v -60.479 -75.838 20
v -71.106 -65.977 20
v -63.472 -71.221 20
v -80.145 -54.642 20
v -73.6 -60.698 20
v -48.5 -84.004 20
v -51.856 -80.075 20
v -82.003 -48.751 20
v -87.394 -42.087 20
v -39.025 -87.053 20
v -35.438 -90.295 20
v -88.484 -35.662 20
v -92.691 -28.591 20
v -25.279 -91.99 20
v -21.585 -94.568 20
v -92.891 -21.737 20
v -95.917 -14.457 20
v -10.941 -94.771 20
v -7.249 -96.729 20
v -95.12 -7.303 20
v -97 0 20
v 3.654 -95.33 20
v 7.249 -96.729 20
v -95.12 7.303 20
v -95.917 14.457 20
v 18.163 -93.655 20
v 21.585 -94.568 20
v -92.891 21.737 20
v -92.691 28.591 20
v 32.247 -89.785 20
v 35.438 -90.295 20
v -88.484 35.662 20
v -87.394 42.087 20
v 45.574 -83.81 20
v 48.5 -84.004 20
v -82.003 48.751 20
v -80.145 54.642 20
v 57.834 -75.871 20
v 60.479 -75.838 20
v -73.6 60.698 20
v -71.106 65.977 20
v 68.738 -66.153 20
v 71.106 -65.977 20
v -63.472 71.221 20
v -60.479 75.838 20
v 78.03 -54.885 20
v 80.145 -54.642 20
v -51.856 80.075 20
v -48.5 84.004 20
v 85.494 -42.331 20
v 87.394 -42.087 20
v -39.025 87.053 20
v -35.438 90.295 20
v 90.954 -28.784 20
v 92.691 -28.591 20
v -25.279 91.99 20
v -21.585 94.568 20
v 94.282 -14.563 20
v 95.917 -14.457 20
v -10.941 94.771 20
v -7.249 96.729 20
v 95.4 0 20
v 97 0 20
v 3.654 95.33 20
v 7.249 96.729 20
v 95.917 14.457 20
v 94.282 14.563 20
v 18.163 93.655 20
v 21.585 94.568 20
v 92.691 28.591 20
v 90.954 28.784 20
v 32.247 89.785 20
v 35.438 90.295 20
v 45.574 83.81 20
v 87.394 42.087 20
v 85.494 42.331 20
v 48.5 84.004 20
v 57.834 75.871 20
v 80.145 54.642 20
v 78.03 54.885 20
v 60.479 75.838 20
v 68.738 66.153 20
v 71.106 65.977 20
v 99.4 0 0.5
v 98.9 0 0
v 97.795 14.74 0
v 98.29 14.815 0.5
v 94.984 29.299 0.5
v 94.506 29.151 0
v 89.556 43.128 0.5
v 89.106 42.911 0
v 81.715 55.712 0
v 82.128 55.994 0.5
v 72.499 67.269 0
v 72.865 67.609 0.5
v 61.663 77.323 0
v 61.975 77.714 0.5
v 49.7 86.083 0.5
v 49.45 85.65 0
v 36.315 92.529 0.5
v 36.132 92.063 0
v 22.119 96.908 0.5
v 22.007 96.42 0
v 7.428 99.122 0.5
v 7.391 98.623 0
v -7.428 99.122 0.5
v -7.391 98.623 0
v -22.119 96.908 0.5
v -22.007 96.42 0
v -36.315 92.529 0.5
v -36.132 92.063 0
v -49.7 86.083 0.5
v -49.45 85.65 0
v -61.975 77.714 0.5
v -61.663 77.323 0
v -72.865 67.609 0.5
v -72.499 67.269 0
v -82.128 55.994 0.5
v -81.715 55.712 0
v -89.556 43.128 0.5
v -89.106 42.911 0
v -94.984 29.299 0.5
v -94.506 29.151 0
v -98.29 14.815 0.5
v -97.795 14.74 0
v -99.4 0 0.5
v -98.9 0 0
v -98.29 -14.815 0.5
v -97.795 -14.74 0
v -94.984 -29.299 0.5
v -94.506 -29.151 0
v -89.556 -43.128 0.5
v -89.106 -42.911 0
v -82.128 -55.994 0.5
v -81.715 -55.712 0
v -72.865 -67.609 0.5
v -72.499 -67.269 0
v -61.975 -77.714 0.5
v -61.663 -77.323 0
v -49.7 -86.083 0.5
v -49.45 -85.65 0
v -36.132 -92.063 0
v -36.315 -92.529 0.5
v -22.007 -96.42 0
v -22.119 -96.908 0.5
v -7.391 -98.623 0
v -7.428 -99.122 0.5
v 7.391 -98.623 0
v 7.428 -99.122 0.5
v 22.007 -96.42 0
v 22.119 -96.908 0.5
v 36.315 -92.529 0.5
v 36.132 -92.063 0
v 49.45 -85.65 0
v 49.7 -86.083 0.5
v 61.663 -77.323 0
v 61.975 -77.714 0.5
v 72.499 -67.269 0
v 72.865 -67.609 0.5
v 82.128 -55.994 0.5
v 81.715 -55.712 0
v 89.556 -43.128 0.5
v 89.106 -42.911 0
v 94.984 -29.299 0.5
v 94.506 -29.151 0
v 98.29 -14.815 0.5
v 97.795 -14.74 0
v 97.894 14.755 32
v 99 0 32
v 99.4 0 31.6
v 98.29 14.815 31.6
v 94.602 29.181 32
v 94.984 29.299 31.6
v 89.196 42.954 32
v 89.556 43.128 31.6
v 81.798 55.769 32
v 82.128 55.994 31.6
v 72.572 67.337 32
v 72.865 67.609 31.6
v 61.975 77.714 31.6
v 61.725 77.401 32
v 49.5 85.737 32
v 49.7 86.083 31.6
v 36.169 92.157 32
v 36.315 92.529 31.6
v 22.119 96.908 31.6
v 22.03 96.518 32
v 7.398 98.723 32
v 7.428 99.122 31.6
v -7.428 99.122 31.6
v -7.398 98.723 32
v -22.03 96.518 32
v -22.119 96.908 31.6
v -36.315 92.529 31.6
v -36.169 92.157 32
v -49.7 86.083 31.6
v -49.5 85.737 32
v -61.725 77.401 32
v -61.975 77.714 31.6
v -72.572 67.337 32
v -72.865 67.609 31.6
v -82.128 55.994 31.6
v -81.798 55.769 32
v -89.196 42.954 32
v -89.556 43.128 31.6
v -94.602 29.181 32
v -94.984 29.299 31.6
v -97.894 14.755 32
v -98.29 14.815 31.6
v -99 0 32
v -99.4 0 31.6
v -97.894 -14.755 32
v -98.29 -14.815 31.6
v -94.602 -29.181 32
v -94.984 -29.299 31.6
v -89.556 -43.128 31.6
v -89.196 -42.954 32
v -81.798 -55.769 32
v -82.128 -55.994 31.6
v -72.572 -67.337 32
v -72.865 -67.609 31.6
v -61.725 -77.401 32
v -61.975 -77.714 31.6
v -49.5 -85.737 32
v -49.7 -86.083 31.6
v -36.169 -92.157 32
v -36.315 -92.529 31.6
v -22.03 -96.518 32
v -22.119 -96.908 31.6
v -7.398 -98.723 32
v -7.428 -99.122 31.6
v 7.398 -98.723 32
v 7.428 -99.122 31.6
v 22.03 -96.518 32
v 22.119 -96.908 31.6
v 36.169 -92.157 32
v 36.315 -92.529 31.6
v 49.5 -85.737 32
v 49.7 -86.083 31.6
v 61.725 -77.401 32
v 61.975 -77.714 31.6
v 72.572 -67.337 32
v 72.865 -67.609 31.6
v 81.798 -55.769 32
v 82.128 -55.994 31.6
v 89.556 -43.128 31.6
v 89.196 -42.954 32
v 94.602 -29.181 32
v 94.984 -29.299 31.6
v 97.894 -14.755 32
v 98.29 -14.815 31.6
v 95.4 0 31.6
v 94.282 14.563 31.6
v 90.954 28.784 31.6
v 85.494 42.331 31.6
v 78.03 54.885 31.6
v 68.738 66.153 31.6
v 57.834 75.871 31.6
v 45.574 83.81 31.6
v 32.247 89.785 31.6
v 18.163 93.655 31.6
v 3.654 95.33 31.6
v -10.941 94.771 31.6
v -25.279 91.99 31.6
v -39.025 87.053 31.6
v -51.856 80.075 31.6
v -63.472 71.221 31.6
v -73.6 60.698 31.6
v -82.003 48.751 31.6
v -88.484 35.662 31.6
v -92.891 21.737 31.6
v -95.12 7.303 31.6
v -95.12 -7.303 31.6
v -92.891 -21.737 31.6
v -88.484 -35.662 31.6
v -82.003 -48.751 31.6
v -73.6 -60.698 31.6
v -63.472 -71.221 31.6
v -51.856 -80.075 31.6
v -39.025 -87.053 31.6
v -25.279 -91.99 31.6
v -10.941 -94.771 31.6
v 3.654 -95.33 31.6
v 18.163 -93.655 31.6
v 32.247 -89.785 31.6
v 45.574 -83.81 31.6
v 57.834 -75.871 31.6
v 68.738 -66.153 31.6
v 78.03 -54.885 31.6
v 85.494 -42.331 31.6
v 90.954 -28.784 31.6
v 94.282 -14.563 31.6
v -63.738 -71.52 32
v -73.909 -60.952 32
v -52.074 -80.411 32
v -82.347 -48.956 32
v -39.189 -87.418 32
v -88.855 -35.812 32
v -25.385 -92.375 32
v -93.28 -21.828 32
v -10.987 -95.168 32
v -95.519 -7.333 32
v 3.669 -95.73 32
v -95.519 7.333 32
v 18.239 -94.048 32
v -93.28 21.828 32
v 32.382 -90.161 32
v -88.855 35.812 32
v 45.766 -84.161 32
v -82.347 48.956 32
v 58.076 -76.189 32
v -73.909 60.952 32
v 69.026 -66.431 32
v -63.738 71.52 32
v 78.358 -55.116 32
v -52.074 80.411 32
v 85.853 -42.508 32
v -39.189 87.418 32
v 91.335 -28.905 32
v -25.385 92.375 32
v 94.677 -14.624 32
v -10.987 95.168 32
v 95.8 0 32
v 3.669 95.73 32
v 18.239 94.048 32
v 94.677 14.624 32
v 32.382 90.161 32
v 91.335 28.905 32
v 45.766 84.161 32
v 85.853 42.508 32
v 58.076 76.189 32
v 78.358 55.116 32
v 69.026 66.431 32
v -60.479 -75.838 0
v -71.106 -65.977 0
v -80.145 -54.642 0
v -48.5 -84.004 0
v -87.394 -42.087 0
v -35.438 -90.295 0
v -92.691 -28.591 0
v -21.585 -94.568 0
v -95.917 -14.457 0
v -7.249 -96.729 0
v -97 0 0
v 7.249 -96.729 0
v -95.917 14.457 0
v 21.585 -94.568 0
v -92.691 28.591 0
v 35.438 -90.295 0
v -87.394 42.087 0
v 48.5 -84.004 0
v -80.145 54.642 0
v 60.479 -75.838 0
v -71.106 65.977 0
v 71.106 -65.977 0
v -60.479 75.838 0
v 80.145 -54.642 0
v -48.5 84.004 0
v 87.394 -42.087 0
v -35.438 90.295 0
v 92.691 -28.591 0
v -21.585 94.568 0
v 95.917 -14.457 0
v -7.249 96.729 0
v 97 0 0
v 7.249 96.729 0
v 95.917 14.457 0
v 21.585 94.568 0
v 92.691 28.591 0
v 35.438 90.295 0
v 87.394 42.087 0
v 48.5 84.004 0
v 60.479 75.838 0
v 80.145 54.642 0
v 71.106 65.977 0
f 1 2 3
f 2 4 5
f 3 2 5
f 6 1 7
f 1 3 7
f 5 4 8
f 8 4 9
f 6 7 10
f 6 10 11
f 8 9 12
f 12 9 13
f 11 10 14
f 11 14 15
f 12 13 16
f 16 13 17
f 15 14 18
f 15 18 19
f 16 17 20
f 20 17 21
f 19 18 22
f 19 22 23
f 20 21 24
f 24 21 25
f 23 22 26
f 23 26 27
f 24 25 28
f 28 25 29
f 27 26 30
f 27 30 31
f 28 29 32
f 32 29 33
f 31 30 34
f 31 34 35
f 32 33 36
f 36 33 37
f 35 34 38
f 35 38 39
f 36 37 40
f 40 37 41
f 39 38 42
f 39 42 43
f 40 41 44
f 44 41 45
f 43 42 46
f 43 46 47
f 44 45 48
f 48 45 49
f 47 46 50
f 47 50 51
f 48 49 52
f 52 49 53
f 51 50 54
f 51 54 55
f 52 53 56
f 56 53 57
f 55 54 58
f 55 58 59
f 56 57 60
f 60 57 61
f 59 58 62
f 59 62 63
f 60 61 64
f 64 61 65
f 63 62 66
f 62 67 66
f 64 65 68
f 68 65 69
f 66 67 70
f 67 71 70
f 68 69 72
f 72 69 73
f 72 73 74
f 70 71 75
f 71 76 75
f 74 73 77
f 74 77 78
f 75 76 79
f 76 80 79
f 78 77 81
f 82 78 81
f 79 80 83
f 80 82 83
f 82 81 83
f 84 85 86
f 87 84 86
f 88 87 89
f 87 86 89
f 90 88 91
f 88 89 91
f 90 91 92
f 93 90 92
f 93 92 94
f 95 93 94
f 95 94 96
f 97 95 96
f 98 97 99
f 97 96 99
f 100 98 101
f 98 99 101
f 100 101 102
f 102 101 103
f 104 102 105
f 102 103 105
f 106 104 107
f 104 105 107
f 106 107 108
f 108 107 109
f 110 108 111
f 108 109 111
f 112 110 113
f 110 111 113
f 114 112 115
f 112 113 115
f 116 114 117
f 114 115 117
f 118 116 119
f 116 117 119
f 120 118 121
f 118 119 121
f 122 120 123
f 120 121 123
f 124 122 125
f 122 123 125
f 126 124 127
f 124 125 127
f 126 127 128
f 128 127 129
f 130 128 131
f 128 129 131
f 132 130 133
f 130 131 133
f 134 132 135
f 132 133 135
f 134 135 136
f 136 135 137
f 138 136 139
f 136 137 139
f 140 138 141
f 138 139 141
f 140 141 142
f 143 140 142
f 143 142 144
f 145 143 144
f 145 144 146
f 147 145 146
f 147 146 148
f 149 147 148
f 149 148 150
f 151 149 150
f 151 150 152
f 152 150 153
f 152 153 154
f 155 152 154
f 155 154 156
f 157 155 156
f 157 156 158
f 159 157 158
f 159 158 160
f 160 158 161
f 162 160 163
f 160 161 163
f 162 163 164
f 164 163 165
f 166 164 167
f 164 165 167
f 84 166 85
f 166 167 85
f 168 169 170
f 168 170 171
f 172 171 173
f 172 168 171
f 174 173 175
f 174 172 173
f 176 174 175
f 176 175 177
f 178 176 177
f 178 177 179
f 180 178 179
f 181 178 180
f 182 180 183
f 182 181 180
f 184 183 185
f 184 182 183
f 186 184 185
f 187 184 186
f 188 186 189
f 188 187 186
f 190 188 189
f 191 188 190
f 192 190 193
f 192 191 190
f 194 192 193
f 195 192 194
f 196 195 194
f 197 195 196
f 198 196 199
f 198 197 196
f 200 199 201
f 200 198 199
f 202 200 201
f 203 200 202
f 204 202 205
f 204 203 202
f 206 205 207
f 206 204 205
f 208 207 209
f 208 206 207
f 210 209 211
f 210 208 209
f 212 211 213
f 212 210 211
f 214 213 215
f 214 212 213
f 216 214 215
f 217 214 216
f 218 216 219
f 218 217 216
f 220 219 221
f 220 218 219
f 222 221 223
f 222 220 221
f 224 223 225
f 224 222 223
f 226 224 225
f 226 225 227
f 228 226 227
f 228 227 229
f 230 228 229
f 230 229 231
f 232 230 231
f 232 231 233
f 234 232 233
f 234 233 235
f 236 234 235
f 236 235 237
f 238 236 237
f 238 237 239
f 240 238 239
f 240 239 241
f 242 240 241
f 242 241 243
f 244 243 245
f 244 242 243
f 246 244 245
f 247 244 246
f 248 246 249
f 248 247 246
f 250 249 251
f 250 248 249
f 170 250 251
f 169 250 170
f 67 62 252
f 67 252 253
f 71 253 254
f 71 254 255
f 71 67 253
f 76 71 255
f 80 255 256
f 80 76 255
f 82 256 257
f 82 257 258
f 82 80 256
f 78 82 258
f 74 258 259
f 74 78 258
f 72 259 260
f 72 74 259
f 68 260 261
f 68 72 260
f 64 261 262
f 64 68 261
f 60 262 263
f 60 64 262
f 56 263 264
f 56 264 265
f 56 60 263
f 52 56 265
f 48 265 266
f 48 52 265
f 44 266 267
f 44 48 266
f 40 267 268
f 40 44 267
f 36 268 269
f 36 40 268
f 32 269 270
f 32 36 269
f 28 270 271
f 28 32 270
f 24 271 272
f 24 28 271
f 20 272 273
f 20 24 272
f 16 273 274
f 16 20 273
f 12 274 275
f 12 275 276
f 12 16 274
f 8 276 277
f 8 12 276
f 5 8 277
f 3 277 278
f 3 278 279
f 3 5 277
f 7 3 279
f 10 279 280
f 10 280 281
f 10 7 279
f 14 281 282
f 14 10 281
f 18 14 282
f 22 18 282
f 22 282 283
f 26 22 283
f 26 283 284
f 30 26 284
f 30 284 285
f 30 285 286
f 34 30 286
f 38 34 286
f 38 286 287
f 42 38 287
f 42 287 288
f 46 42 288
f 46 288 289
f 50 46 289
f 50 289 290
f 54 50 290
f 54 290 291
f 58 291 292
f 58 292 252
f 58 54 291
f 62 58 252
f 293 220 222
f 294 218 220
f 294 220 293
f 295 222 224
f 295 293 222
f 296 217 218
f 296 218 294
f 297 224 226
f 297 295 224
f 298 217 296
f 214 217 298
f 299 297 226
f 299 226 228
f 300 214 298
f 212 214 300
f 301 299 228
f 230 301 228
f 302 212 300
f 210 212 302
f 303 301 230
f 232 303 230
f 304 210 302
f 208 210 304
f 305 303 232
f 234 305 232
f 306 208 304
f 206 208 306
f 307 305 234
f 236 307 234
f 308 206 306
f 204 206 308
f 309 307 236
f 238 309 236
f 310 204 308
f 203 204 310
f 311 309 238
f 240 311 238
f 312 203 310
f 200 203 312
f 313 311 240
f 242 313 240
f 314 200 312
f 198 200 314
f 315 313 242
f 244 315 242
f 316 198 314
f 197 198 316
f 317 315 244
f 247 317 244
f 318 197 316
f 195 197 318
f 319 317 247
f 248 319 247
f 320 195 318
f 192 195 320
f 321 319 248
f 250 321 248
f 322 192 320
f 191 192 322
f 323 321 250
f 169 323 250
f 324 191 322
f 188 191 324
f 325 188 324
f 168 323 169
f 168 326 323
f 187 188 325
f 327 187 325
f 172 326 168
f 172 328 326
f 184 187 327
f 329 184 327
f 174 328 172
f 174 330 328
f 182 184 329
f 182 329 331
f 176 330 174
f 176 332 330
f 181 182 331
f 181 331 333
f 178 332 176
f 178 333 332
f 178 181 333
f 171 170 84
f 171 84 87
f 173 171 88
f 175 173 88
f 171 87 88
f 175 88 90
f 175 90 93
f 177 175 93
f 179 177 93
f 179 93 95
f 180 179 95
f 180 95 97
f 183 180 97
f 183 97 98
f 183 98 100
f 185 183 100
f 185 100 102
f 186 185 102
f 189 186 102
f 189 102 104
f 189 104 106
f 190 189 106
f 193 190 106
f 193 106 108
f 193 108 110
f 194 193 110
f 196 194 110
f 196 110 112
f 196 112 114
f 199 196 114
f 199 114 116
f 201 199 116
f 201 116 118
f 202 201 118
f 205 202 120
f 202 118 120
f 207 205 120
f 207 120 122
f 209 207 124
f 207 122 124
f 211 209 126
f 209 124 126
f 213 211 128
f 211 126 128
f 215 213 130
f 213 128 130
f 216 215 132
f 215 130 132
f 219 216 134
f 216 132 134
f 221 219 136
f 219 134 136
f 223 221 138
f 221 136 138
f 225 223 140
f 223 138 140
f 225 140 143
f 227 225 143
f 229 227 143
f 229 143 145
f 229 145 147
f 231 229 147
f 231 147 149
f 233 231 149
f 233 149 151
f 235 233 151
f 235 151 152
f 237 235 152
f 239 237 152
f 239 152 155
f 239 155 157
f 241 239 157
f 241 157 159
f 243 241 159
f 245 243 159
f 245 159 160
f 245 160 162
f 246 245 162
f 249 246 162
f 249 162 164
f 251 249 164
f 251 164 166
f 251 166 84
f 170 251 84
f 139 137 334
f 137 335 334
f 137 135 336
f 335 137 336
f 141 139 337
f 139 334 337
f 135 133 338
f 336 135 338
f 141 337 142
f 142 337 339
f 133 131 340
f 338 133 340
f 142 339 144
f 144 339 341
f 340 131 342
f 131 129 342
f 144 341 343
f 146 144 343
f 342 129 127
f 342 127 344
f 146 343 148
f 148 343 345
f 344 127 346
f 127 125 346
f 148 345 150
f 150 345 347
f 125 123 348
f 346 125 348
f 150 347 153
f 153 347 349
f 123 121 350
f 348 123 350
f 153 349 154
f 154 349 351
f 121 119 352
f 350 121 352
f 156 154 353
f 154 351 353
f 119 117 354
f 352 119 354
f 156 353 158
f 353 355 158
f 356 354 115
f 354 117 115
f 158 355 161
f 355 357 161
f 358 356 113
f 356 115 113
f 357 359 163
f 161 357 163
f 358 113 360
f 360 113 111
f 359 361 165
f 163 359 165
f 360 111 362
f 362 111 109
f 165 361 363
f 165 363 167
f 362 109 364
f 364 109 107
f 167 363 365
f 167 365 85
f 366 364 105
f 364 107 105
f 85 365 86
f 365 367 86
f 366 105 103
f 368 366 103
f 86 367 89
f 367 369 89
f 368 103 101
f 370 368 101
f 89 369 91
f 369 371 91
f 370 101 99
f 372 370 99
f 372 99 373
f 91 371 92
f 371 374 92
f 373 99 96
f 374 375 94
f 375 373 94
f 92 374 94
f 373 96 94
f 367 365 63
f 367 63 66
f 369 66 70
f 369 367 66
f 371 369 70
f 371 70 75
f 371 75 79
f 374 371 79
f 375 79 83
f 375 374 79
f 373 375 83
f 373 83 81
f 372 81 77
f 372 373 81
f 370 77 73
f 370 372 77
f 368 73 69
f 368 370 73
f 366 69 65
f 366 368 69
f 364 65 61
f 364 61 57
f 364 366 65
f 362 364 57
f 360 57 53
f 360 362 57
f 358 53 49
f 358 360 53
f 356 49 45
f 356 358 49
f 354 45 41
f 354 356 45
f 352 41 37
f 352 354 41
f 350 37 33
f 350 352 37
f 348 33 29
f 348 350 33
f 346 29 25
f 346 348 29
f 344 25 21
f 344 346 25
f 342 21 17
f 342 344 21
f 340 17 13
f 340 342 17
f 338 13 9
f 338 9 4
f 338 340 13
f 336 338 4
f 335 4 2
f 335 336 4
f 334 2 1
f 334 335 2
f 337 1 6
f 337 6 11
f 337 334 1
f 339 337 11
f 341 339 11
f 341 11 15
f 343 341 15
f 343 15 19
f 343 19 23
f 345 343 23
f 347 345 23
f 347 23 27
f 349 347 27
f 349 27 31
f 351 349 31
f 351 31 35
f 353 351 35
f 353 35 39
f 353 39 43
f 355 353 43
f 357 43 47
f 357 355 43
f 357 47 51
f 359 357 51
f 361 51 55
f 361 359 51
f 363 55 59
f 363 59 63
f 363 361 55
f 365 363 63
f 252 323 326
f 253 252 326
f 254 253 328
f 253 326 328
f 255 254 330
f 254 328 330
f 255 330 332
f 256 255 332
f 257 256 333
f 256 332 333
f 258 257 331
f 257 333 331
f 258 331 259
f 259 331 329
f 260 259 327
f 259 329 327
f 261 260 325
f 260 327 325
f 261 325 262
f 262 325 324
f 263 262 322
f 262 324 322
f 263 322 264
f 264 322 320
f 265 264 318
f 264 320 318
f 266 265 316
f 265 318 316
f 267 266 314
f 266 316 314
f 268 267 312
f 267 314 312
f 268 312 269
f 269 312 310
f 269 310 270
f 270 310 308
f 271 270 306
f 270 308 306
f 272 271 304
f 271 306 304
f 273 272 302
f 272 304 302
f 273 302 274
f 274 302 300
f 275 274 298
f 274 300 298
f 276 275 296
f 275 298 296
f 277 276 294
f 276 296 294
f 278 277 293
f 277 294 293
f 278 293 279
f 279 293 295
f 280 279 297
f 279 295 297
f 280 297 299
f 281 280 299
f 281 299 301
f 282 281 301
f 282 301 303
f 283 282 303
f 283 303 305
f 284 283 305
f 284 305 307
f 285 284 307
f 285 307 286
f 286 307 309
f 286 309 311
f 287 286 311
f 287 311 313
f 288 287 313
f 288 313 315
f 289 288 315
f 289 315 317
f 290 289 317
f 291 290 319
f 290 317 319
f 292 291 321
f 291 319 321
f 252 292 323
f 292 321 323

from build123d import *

# Parameters (mm, degrees)
F0_R     = 99.4
F0_R_2   = 97
F1_DEPTH = 20
F2_R     = 99.4
F2_R_2   = 95.4
F3_DEPTH = 12
F4_SIZE  = 0.4
F5_SIZE  = 0.5


with BuildPart() as f1:
    # F0 (on Top) → F1 (new body)
    with BuildSketch(Plane.XY):
        Circle(F0_R)
        Circle(F0_R_2, mode=Mode.SUBTRACT)
    extrude(amount=F1_DEPTH)

    # F2 (on face) → F3 (join)
    with BuildSketch(Plane.XY.offset(20)):
        Circle(F2_R)
        Circle(F2_R_2, mode=Mode.SUBTRACT)
    extrude(amount=F3_DEPTH)

    # F4
    f4_edges = [f1.edges().sort_by_distance(p)[0] for p in [
        (-99.4, 0, 32),
        (-95.4, 0, 32),
    ]]
    chamfer(f4_edges, length=F4_SIZE)

    # F5
    f5_edges = [f1.edges().sort_by_distance(p)[0] for p in [
        (-99.4, 0, 0),
    ]]
    chamfer(f5_edges, length=F5_SIZE)


solid = f1.part
